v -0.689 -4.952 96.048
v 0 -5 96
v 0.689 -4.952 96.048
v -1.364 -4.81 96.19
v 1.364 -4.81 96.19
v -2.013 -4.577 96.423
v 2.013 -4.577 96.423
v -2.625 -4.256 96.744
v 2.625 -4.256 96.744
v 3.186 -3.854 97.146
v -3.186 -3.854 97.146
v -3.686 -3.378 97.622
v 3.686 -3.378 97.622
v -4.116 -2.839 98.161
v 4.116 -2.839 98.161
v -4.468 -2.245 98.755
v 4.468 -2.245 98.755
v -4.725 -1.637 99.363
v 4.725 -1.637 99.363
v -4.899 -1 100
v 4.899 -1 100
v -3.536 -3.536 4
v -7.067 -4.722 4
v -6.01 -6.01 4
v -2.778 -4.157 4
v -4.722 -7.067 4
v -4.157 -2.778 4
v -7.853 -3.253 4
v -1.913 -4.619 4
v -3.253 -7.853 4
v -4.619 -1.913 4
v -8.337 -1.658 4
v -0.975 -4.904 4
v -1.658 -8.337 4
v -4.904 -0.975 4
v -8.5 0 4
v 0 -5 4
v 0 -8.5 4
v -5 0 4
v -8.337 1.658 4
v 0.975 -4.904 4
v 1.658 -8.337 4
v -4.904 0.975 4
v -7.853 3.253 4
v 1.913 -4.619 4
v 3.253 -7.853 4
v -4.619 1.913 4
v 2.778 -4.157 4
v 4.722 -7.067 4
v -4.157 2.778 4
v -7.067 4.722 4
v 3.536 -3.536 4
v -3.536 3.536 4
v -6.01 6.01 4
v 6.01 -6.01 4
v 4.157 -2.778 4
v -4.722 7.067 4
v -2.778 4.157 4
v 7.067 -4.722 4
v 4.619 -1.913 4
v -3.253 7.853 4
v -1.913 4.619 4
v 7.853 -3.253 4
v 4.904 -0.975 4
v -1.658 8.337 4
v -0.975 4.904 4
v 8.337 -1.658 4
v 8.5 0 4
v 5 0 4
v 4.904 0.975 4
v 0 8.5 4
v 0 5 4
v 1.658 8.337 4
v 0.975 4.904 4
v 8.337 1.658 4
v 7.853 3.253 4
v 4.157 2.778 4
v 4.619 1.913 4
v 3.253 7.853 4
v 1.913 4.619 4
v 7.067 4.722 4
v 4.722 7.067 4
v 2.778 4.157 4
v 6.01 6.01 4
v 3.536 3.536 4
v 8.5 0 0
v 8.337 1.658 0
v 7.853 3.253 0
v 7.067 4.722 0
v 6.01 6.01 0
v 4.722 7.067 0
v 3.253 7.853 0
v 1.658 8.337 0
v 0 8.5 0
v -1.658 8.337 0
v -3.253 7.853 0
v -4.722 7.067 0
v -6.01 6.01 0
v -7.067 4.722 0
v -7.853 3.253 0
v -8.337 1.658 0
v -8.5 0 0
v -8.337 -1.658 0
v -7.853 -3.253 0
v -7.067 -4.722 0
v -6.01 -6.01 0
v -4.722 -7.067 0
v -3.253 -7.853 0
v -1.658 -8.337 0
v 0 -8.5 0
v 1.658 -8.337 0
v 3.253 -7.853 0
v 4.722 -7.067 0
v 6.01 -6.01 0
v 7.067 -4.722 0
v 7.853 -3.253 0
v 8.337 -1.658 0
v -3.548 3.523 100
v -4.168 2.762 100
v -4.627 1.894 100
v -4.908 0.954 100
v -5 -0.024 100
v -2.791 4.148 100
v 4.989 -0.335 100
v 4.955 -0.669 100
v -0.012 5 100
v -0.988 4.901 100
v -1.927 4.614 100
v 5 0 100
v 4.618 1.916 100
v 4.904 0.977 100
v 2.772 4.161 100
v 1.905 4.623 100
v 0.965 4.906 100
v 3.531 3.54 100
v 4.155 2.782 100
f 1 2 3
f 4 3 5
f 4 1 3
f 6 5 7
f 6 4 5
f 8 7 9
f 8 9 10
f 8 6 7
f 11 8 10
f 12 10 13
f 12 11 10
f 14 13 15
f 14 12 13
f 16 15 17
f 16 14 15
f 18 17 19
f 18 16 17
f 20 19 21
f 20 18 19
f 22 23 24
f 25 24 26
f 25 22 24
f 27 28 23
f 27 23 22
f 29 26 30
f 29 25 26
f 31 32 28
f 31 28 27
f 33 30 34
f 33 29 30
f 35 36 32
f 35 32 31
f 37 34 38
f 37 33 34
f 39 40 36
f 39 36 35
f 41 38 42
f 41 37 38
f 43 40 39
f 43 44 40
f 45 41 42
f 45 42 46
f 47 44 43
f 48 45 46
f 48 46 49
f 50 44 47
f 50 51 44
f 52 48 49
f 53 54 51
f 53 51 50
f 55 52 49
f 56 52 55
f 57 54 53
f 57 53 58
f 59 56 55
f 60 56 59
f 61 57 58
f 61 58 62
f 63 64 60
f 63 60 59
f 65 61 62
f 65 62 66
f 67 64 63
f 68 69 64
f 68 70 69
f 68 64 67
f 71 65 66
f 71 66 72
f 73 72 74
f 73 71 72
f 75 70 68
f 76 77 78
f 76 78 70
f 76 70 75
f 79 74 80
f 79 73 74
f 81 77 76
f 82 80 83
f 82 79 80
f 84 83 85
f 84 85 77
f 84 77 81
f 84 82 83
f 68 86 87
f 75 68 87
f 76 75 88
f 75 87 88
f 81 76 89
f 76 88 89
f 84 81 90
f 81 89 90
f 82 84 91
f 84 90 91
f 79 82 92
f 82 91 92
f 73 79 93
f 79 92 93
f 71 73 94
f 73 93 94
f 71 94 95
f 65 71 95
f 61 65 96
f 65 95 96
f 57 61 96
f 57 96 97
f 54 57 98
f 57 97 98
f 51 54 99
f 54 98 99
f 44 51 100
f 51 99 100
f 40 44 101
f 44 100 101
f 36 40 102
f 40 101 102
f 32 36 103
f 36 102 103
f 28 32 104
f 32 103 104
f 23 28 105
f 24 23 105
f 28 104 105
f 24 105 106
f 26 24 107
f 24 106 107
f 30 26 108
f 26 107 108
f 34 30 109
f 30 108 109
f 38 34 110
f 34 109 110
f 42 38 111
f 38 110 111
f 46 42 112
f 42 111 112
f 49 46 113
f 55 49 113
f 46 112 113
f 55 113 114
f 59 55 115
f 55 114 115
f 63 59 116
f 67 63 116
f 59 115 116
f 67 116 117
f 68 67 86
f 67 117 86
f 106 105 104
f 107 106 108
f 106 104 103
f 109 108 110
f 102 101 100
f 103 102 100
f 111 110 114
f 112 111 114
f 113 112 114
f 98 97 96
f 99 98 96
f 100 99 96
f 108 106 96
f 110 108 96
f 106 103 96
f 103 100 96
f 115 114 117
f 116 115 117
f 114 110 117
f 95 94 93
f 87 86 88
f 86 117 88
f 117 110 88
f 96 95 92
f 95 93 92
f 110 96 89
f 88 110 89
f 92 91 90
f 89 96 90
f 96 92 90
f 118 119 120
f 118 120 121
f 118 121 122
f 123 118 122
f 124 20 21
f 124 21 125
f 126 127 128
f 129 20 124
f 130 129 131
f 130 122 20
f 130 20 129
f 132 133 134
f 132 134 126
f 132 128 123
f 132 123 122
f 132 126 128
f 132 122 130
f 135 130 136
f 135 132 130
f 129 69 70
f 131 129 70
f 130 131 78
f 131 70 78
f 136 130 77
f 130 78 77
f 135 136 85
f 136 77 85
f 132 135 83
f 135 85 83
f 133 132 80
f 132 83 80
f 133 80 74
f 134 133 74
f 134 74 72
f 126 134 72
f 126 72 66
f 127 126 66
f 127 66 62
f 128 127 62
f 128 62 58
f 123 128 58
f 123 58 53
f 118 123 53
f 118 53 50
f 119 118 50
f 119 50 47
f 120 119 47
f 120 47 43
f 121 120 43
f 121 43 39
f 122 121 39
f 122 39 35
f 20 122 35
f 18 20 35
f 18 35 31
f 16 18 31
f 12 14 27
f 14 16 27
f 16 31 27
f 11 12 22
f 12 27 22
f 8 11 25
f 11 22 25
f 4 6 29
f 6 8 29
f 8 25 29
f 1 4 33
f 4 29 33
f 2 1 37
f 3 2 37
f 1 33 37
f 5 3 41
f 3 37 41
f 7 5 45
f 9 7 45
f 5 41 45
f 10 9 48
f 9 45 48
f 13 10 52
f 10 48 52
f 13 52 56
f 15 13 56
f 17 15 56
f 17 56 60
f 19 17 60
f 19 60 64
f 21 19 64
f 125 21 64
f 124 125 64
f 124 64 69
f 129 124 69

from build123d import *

# Parameters (mm, degrees)
F0_R          = 8.5
F1_DEPTH      = 4
F2_R          = 5
F3_DEPTH      = 100
F5_DEPTH      = 25
F5_DEPTH_BACK = 25


with BuildPart() as f1:
    # F0 (on Top) → F1 (new body)
    with BuildSketch(Plane.XY):
        Circle(F0_R)
    extrude(amount=F1_DEPTH)

    # F2 (on Top) → F3 (join)
    with BuildSketch(Plane.XY):
        Circle(F2_R)
    extrude(amount=F3_DEPTH)

    # F4 (on Right) → F5 (cut, two sides)
    with BuildSketch(Plane.YZ) as f5_sk:
        Polygon((0, 101), (-5, 101), (-5, 96), align=None)
    extrude(amount=F5_DEPTH, mode=Mode.SUBTRACT)
    extrude(f5_sk.sketch, amount=-F5_DEPTH_BACK, mode=Mode.SUBTRACT)


solid = f1.part
